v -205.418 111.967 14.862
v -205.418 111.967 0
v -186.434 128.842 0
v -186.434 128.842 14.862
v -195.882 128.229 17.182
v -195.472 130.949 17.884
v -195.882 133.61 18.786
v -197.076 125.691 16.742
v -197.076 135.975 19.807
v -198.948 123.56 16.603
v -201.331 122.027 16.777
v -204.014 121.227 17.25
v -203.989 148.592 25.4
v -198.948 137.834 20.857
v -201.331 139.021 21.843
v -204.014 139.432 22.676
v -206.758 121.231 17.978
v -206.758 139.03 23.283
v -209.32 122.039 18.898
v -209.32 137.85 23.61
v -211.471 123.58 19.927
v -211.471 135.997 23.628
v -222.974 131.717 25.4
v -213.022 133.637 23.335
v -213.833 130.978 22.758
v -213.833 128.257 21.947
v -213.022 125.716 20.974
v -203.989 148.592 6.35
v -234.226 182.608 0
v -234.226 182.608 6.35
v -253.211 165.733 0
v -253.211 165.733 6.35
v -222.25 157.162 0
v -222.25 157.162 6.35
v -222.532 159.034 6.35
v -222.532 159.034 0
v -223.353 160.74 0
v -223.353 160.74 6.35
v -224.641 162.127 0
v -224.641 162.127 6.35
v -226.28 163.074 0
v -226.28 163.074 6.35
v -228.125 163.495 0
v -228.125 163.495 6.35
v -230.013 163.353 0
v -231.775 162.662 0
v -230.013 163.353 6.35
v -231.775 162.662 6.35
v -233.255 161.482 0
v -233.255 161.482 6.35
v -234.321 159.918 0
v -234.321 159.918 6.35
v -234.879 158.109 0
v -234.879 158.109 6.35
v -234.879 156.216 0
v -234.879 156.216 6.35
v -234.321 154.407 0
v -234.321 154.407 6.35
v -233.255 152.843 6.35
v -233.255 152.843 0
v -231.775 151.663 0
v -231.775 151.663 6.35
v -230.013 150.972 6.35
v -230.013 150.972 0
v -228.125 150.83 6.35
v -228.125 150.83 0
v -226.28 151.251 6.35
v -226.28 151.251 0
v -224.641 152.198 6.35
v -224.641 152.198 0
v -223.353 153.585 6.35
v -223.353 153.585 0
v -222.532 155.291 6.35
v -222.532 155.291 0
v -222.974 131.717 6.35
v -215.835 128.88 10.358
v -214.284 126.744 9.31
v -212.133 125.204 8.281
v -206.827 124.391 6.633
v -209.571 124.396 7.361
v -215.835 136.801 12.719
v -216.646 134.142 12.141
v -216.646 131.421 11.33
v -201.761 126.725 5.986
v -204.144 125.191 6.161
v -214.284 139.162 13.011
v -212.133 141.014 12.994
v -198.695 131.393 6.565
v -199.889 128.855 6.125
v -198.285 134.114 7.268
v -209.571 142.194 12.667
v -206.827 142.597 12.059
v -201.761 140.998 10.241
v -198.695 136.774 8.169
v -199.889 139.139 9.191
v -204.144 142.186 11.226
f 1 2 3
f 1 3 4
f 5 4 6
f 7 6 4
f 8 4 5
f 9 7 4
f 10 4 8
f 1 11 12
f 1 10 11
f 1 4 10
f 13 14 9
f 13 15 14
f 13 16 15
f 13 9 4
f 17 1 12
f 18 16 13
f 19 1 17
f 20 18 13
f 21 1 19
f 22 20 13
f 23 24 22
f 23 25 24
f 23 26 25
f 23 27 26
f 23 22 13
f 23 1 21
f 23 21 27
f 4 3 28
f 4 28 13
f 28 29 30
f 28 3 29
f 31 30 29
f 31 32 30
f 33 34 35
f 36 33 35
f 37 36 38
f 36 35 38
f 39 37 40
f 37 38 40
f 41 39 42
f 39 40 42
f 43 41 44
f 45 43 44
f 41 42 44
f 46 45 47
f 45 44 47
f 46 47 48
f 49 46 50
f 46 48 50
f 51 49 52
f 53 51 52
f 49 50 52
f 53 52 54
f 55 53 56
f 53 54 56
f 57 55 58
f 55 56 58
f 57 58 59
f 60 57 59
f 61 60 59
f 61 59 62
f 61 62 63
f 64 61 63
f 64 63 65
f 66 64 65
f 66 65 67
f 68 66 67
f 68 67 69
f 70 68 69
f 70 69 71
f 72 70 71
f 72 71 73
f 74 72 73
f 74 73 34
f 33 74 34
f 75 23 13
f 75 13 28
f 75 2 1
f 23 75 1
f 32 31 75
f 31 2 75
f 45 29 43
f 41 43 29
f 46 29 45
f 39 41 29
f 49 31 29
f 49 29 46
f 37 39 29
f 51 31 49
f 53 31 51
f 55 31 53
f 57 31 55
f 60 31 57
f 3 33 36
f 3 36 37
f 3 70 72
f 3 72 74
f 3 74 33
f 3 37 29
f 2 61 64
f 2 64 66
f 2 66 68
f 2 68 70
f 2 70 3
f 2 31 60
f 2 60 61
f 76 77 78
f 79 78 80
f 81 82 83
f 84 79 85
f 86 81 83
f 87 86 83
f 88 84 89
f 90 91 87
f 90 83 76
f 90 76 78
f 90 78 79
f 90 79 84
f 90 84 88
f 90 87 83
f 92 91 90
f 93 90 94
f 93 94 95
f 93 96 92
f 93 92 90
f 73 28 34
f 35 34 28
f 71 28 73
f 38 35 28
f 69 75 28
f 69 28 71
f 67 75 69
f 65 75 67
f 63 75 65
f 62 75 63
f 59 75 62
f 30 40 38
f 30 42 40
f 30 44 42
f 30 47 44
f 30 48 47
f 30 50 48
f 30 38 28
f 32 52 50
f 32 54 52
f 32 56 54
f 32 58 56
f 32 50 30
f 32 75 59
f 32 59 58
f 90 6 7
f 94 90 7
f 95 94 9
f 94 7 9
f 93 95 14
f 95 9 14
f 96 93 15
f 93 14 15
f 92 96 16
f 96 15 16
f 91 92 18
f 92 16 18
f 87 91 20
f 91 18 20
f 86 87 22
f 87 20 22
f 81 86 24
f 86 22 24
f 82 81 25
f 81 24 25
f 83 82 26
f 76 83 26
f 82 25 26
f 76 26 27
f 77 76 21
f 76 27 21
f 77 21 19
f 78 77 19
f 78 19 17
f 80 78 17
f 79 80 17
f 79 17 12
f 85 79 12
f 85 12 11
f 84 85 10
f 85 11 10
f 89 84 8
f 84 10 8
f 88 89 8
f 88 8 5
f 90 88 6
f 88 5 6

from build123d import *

# Parameters (mm, degrees)
BOSS_EXTRUDE1_DEPTH = 12.7
SKETCH4_R           = 6.35
CUT_EXTRUDE1_DEPTH  = 7.35
SKETCH5_R           = 9.525
CUT_EXTRUDE2_DEPTH  = 11.43


with BuildPart() as part:
    # Sketch3 → Boss-Extrude1 (new body, symmetric)
    with BuildSketch(Plane(origin=(-49.66137931, -44.143448276, 0), x_dir=(0, 0, 1), z_dir=(-0.747409319, -0.664363839, 0))):
        Polygon((0, 292.094644262), (0, 220.157811167), (14.861770509, 220.157811167), (25.4, 246.581936946), (6.35, 246.581936946), (6.35, 292.094644262), align=None)
    extrude(amount=BOSS_EXTRUDE1_DEPTH, both=True)

    # Sketch4 → Cut-Extrude1 (cut, through all)
    with BuildSketch(Plane.XY.offset(6.35)):
        with Locations((-228.6, 157.1625)):
            Circle(SKETCH4_R)
    extrude(amount=-CUT_EXTRUDE1_DEPTH, mode=Mode.SUBTRACT)

    # Sketch5 → Cut-Extrude2 (cut)
    with BuildSketch(Plane(origin=(-16.673775789, 18.757997763, -62.930465953), x_dir=(0.969242963, 0.07030135, -0.235851222), z_dir=(0.246105828, -0.276869057, 0.928857065))):
        with Locations((-193.99687807, 130.601446216)):
            Circle(SKETCH5_R)
    extrude(amount=-CUT_EXTRUDE2_DEPTH, mode=Mode.SUBTRACT)


solid = part.part
